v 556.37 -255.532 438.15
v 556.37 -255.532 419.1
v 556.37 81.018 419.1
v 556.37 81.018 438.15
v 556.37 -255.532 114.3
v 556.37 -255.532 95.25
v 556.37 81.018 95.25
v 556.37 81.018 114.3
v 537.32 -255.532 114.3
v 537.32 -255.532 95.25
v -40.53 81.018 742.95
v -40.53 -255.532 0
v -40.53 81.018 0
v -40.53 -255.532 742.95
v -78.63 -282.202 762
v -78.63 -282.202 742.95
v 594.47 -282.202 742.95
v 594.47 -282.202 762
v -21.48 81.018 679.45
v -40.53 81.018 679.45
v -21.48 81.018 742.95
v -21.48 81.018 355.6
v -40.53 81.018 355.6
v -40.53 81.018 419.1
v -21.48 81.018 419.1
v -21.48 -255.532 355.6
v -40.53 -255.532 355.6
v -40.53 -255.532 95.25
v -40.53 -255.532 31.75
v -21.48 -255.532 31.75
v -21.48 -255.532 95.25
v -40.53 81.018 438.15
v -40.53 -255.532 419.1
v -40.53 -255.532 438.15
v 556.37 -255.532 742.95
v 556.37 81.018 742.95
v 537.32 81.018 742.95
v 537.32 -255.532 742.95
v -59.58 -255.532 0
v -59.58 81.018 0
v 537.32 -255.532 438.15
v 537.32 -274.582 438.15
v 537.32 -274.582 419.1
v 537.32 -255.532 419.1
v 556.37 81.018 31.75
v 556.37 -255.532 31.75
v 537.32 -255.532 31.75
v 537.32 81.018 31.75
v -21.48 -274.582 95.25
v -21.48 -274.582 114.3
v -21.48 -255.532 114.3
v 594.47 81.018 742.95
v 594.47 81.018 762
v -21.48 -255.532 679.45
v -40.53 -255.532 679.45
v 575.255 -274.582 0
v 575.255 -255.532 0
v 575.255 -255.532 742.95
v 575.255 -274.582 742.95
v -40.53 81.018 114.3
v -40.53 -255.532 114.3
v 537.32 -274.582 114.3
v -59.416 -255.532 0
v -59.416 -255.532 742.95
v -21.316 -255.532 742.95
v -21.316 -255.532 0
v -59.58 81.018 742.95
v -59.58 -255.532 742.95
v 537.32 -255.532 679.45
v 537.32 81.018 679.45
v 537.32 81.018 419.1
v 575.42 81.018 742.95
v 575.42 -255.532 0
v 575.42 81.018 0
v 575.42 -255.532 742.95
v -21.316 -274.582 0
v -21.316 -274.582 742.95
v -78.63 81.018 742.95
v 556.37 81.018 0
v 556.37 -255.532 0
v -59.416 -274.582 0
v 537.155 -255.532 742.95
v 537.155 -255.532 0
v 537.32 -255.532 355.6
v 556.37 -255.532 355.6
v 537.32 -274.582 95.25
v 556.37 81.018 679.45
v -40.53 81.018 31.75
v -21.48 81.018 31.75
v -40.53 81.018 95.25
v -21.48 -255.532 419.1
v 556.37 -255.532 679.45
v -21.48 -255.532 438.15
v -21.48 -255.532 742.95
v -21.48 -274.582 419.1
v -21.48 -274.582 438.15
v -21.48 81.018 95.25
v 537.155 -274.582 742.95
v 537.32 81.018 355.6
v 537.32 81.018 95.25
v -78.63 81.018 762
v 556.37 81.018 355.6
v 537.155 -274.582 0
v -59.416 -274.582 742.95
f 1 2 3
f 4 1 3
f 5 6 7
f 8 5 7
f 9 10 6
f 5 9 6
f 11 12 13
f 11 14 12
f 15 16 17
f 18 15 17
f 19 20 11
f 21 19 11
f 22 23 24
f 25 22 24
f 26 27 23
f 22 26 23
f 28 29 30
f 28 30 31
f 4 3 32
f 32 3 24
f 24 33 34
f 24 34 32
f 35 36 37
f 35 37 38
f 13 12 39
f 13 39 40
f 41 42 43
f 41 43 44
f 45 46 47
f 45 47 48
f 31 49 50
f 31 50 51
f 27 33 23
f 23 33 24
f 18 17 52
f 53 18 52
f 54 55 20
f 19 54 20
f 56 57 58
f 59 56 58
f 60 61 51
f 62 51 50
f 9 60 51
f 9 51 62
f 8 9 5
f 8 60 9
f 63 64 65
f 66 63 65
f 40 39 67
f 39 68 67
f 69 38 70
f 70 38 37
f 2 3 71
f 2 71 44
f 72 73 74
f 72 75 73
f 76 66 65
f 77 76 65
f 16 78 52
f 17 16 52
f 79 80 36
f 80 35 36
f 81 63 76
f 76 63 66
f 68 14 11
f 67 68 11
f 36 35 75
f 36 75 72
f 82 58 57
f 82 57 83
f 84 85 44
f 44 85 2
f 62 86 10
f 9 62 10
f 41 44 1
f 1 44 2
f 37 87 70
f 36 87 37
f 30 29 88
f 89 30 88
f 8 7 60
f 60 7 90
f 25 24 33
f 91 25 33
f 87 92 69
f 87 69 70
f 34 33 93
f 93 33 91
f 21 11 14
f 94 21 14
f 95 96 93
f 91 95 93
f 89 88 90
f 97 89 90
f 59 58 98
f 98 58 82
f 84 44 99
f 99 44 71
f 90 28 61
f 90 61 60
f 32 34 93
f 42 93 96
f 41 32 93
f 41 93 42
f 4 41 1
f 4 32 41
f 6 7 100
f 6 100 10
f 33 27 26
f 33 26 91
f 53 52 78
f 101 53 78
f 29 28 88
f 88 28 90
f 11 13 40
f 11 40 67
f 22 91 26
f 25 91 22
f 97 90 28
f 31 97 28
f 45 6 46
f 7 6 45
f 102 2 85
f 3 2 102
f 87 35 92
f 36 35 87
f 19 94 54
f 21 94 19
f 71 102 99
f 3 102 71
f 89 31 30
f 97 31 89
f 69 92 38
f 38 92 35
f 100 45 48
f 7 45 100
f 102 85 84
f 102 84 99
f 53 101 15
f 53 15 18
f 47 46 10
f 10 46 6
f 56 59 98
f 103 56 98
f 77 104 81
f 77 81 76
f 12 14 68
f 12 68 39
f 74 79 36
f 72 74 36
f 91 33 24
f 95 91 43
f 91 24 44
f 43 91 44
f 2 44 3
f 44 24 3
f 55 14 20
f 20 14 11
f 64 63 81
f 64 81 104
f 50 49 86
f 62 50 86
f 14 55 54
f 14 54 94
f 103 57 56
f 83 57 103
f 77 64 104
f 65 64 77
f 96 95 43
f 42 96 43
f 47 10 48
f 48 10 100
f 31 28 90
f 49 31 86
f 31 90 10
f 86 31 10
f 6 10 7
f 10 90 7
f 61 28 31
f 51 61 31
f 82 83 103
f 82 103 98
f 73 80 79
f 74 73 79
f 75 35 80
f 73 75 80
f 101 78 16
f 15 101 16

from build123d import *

# Parameters (mm, degrees)
F0_W      = 19.05
F0_H      = 63.5
F1_DEPTH  = 742.95
F2_W      = 19.05
F2_H      = 63.5
F2_W_2    = 673.1
F2_H_2    = 179.07
F3_DEPTH  = 19.05
F4_W      = 63.5
F4_H      = 63.5
F4_W_2    = 273.05
F5_DEPTH  = 19.05
F8_W      = 19.05
F8_H      = 336.55
F8_W_2    = 558.8
F8_H_2    = 19.05
F9_DEPTH  = 19.05
F10_W     = 19.05
F10_H     = 336.55
F10_W_2   = 558.8
F10_H_2   = 19.05
F11_DEPTH = 19.05
F16_W     = 336.55
F16_H     = 679.45
F16_H_2   = 63.5
F17_DEPTH = 19.05
F20_W     = 38.1
F20_H     = 742.95
F21_DEPTH = 19.05


with BuildPart() as f1:
    # F0 (on Top) → F1 (new body)
    with BuildSketch(Plane.XY):
        with Locations((-50.0554830029, 49.2678843021)):
            Rectangle(F0_W, F0_H)
    extrude(amount=F1_DEPTH)


with BuildPart() as f1b:
    # F0 (on Top) → F1, piece 2 (new body)
    with BuildSketch(Plane.XY):
        with Locations((-50.0554830029, -223.7821156979)):
            Rectangle(F0_W, F0_H)
    extrude(amount=F1_DEPTH)


with BuildPart() as f1c:
    # F0 (on Top) → F1, piece 3 (new body)
    with BuildSketch(Plane.XY):
        with Locations((565.8945169971, -223.7821156979)):
            Rectangle(F0_W, F0_H)
    extrude(amount=F1_DEPTH)


with BuildPart() as f1d:
    # F0 (on Top) → F1, piece 4 (new body)
    with BuildSketch(Plane.XY):
        with Locations((565.8945169971, 49.2678843021)):
            Rectangle(F0_W, F0_H)
    extrude(amount=F1_DEPTH)


with BuildPart() as f3:
    # F2 (on face) → F3 (new body)
    with BuildSketch(Plane.XY.offset(742.95)):
        with Locations((565.8945169971, 49.2678843021)):
            Rectangle(F2_W, F2_H)
        Polygon((594.4695169971, -103.1321156979), (594.4695169971, 81.0178843021), (575.4195169971, 81.0178843021), (575.4195169971, 17.5178843021), (556.3695169971, 17.5178843021), (556.3695169971, 81.0178843021), (-78.6304830029, 81.0178843021), (-78.6304830029, -103.1321156979), align=None)
        with Locations((257.9195169971, -192.6671156979)):
            Rectangle(F2_W_2, F2_H_2)
    extrude(amount=F3_DEPTH)


with BuildPart() as f5:
    # F4 (on face) → F5 (new body)
    with BuildSketch(Plane.YZ.offset(-40.5304830029)):
        with Locations((-223.7821156979, 711.2)):
            Rectangle(F4_W, F4_H)
        with Locations((-55.5071156979, 711.2)):
            Rectangle(F4_W_2, F4_H)
    extrude(amount=F5_DEPTH)


with BuildPart() as f5b:
    # F4 (on face) → F5, piece 2 (new body)
    with BuildSketch(Plane.YZ.offset(-40.5304830029)):
        with Locations((-223.7821156979, 387.35)):
            Rectangle(F4_W, F4_H)
        with Locations((-55.5071156979, 387.35)):
            Rectangle(F4_W_2, F4_H)
    extrude(amount=F5_DEPTH)


with BuildPart() as f5c:
    # F4 (on face) → F5, piece 3 (new body)
    with BuildSketch(Plane.YZ.offset(-40.5304830029)):
        with Locations((-223.7821156979, 63.5)):
            Rectangle(F4_W, F4_H)
        with Locations((-55.5071156979, 63.5)):
            Rectangle(F4_W_2, F4_H)
    extrude(amount=F5_DEPTH)


with BuildPart() as f7_1:
    # F7: instance of F5c
    add(f5c.part.mirror(Plane(origin=(257.9195169971, 49.2678843021, 371.475), x_dir=(0, -1, 0), z_dir=(-1, 0, 0))))


with BuildPart() as f7_2:
    # F7: instance of F5b
    add(f5b.part.mirror(Plane(origin=(257.9195169971, 49.2678843021, 371.475), x_dir=(0, -1, 0), z_dir=(-1, 0, 0))))


with BuildPart() as f7_3:
    # F7: instance of F5
    add(f5.part.mirror(Plane(origin=(257.9195169971, 49.2678843021, 371.475), x_dir=(0, -1, 0), z_dir=(-1, 0, 0))))


with BuildPart() as f9:
    # F8 (on face) → F9 (new body)
    with BuildSketch(Plane.XY.offset(95.25)):
        Polygon((556.3695169971, 81.0178843021), (-21.4804830029, 81.0178843021), (-21.4804830029, -255.5321156979), (537.3195169971, -255.5321156979), (556.3695169971, -255.5321156979), align=None)
        with Locations((-31.0054830029, -87.2571156979)):
            Rectangle(F8_W, F8_H)
        with Locations((257.9195169971, -265.0571156979)):
            Rectangle(F8_W_2, F8_H_2)
    extrude(amount=F9_DEPTH)


with BuildPart() as f11:
    # F10 (on face) → F11 (new body)
    with BuildSketch(Plane.XY.offset(419.1)):
        Polygon((556.3695169971, 81.0178843021), (-21.4804830029, 81.0178843021), (-21.4804830029, -255.5321156979), (537.3195169971, -255.5321156979), (556.3695169971, -255.5321156979), align=None)
        with Locations((-31.0054830029, -87.2571156979)):
            Rectangle(F10_W, F10_H)
        with Locations((257.9195169971, -265.0571156979)):
            Rectangle(F10_W_2, F10_H_2)
    extrude(amount=F11_DEPTH)


with BuildPart() as f17:
    # F16 (on face) → F17 (new body)
    with BuildSketch(Plane.YZ.offset(556.3695169971)):
        with Locations((-87.2571156979, 339.725)):
            Rectangle(F16_W, F16_H)
        with Locations((-87.2571156979, 711.2)):
            Rectangle(F16_W, F16_H_2)
    extrude(amount=F17_DEPTH)


with BuildPart() as f18_1:
    # F18: instance of F17
    add(f17.part.mirror(Plane(origin=(257.9195169971, 49.2678843021, 371.475), x_dir=(0, -1, 0), z_dir=(-1, 0, 0))))


with BuildPart() as f21:
    # F20 (on face) → F21 (new body)
    with BuildSketch(Plane.XZ.offset(255.5321156979)):
        with Locations((-40.36571032, 371.475)):
            Rectangle(F20_W, F20_H)
    extrude(amount=F21_DEPTH)


with BuildPart() as f22_1:
    # F22: instance of F21
    add(f21.part.mirror(Plane(origin=(257.9195169971, 49.2678843021, 371.475), x_dir=(0, -1, 0), z_dir=(-1, 0, 0))))


solid = Compound([f3.part, f5.part, f5b.part, f5c.part, f7_1.part, f7_2.part, f7_3.part, f9.part, f11.part, f17.part, f18_1.part, f21.part, f22_1.part])
